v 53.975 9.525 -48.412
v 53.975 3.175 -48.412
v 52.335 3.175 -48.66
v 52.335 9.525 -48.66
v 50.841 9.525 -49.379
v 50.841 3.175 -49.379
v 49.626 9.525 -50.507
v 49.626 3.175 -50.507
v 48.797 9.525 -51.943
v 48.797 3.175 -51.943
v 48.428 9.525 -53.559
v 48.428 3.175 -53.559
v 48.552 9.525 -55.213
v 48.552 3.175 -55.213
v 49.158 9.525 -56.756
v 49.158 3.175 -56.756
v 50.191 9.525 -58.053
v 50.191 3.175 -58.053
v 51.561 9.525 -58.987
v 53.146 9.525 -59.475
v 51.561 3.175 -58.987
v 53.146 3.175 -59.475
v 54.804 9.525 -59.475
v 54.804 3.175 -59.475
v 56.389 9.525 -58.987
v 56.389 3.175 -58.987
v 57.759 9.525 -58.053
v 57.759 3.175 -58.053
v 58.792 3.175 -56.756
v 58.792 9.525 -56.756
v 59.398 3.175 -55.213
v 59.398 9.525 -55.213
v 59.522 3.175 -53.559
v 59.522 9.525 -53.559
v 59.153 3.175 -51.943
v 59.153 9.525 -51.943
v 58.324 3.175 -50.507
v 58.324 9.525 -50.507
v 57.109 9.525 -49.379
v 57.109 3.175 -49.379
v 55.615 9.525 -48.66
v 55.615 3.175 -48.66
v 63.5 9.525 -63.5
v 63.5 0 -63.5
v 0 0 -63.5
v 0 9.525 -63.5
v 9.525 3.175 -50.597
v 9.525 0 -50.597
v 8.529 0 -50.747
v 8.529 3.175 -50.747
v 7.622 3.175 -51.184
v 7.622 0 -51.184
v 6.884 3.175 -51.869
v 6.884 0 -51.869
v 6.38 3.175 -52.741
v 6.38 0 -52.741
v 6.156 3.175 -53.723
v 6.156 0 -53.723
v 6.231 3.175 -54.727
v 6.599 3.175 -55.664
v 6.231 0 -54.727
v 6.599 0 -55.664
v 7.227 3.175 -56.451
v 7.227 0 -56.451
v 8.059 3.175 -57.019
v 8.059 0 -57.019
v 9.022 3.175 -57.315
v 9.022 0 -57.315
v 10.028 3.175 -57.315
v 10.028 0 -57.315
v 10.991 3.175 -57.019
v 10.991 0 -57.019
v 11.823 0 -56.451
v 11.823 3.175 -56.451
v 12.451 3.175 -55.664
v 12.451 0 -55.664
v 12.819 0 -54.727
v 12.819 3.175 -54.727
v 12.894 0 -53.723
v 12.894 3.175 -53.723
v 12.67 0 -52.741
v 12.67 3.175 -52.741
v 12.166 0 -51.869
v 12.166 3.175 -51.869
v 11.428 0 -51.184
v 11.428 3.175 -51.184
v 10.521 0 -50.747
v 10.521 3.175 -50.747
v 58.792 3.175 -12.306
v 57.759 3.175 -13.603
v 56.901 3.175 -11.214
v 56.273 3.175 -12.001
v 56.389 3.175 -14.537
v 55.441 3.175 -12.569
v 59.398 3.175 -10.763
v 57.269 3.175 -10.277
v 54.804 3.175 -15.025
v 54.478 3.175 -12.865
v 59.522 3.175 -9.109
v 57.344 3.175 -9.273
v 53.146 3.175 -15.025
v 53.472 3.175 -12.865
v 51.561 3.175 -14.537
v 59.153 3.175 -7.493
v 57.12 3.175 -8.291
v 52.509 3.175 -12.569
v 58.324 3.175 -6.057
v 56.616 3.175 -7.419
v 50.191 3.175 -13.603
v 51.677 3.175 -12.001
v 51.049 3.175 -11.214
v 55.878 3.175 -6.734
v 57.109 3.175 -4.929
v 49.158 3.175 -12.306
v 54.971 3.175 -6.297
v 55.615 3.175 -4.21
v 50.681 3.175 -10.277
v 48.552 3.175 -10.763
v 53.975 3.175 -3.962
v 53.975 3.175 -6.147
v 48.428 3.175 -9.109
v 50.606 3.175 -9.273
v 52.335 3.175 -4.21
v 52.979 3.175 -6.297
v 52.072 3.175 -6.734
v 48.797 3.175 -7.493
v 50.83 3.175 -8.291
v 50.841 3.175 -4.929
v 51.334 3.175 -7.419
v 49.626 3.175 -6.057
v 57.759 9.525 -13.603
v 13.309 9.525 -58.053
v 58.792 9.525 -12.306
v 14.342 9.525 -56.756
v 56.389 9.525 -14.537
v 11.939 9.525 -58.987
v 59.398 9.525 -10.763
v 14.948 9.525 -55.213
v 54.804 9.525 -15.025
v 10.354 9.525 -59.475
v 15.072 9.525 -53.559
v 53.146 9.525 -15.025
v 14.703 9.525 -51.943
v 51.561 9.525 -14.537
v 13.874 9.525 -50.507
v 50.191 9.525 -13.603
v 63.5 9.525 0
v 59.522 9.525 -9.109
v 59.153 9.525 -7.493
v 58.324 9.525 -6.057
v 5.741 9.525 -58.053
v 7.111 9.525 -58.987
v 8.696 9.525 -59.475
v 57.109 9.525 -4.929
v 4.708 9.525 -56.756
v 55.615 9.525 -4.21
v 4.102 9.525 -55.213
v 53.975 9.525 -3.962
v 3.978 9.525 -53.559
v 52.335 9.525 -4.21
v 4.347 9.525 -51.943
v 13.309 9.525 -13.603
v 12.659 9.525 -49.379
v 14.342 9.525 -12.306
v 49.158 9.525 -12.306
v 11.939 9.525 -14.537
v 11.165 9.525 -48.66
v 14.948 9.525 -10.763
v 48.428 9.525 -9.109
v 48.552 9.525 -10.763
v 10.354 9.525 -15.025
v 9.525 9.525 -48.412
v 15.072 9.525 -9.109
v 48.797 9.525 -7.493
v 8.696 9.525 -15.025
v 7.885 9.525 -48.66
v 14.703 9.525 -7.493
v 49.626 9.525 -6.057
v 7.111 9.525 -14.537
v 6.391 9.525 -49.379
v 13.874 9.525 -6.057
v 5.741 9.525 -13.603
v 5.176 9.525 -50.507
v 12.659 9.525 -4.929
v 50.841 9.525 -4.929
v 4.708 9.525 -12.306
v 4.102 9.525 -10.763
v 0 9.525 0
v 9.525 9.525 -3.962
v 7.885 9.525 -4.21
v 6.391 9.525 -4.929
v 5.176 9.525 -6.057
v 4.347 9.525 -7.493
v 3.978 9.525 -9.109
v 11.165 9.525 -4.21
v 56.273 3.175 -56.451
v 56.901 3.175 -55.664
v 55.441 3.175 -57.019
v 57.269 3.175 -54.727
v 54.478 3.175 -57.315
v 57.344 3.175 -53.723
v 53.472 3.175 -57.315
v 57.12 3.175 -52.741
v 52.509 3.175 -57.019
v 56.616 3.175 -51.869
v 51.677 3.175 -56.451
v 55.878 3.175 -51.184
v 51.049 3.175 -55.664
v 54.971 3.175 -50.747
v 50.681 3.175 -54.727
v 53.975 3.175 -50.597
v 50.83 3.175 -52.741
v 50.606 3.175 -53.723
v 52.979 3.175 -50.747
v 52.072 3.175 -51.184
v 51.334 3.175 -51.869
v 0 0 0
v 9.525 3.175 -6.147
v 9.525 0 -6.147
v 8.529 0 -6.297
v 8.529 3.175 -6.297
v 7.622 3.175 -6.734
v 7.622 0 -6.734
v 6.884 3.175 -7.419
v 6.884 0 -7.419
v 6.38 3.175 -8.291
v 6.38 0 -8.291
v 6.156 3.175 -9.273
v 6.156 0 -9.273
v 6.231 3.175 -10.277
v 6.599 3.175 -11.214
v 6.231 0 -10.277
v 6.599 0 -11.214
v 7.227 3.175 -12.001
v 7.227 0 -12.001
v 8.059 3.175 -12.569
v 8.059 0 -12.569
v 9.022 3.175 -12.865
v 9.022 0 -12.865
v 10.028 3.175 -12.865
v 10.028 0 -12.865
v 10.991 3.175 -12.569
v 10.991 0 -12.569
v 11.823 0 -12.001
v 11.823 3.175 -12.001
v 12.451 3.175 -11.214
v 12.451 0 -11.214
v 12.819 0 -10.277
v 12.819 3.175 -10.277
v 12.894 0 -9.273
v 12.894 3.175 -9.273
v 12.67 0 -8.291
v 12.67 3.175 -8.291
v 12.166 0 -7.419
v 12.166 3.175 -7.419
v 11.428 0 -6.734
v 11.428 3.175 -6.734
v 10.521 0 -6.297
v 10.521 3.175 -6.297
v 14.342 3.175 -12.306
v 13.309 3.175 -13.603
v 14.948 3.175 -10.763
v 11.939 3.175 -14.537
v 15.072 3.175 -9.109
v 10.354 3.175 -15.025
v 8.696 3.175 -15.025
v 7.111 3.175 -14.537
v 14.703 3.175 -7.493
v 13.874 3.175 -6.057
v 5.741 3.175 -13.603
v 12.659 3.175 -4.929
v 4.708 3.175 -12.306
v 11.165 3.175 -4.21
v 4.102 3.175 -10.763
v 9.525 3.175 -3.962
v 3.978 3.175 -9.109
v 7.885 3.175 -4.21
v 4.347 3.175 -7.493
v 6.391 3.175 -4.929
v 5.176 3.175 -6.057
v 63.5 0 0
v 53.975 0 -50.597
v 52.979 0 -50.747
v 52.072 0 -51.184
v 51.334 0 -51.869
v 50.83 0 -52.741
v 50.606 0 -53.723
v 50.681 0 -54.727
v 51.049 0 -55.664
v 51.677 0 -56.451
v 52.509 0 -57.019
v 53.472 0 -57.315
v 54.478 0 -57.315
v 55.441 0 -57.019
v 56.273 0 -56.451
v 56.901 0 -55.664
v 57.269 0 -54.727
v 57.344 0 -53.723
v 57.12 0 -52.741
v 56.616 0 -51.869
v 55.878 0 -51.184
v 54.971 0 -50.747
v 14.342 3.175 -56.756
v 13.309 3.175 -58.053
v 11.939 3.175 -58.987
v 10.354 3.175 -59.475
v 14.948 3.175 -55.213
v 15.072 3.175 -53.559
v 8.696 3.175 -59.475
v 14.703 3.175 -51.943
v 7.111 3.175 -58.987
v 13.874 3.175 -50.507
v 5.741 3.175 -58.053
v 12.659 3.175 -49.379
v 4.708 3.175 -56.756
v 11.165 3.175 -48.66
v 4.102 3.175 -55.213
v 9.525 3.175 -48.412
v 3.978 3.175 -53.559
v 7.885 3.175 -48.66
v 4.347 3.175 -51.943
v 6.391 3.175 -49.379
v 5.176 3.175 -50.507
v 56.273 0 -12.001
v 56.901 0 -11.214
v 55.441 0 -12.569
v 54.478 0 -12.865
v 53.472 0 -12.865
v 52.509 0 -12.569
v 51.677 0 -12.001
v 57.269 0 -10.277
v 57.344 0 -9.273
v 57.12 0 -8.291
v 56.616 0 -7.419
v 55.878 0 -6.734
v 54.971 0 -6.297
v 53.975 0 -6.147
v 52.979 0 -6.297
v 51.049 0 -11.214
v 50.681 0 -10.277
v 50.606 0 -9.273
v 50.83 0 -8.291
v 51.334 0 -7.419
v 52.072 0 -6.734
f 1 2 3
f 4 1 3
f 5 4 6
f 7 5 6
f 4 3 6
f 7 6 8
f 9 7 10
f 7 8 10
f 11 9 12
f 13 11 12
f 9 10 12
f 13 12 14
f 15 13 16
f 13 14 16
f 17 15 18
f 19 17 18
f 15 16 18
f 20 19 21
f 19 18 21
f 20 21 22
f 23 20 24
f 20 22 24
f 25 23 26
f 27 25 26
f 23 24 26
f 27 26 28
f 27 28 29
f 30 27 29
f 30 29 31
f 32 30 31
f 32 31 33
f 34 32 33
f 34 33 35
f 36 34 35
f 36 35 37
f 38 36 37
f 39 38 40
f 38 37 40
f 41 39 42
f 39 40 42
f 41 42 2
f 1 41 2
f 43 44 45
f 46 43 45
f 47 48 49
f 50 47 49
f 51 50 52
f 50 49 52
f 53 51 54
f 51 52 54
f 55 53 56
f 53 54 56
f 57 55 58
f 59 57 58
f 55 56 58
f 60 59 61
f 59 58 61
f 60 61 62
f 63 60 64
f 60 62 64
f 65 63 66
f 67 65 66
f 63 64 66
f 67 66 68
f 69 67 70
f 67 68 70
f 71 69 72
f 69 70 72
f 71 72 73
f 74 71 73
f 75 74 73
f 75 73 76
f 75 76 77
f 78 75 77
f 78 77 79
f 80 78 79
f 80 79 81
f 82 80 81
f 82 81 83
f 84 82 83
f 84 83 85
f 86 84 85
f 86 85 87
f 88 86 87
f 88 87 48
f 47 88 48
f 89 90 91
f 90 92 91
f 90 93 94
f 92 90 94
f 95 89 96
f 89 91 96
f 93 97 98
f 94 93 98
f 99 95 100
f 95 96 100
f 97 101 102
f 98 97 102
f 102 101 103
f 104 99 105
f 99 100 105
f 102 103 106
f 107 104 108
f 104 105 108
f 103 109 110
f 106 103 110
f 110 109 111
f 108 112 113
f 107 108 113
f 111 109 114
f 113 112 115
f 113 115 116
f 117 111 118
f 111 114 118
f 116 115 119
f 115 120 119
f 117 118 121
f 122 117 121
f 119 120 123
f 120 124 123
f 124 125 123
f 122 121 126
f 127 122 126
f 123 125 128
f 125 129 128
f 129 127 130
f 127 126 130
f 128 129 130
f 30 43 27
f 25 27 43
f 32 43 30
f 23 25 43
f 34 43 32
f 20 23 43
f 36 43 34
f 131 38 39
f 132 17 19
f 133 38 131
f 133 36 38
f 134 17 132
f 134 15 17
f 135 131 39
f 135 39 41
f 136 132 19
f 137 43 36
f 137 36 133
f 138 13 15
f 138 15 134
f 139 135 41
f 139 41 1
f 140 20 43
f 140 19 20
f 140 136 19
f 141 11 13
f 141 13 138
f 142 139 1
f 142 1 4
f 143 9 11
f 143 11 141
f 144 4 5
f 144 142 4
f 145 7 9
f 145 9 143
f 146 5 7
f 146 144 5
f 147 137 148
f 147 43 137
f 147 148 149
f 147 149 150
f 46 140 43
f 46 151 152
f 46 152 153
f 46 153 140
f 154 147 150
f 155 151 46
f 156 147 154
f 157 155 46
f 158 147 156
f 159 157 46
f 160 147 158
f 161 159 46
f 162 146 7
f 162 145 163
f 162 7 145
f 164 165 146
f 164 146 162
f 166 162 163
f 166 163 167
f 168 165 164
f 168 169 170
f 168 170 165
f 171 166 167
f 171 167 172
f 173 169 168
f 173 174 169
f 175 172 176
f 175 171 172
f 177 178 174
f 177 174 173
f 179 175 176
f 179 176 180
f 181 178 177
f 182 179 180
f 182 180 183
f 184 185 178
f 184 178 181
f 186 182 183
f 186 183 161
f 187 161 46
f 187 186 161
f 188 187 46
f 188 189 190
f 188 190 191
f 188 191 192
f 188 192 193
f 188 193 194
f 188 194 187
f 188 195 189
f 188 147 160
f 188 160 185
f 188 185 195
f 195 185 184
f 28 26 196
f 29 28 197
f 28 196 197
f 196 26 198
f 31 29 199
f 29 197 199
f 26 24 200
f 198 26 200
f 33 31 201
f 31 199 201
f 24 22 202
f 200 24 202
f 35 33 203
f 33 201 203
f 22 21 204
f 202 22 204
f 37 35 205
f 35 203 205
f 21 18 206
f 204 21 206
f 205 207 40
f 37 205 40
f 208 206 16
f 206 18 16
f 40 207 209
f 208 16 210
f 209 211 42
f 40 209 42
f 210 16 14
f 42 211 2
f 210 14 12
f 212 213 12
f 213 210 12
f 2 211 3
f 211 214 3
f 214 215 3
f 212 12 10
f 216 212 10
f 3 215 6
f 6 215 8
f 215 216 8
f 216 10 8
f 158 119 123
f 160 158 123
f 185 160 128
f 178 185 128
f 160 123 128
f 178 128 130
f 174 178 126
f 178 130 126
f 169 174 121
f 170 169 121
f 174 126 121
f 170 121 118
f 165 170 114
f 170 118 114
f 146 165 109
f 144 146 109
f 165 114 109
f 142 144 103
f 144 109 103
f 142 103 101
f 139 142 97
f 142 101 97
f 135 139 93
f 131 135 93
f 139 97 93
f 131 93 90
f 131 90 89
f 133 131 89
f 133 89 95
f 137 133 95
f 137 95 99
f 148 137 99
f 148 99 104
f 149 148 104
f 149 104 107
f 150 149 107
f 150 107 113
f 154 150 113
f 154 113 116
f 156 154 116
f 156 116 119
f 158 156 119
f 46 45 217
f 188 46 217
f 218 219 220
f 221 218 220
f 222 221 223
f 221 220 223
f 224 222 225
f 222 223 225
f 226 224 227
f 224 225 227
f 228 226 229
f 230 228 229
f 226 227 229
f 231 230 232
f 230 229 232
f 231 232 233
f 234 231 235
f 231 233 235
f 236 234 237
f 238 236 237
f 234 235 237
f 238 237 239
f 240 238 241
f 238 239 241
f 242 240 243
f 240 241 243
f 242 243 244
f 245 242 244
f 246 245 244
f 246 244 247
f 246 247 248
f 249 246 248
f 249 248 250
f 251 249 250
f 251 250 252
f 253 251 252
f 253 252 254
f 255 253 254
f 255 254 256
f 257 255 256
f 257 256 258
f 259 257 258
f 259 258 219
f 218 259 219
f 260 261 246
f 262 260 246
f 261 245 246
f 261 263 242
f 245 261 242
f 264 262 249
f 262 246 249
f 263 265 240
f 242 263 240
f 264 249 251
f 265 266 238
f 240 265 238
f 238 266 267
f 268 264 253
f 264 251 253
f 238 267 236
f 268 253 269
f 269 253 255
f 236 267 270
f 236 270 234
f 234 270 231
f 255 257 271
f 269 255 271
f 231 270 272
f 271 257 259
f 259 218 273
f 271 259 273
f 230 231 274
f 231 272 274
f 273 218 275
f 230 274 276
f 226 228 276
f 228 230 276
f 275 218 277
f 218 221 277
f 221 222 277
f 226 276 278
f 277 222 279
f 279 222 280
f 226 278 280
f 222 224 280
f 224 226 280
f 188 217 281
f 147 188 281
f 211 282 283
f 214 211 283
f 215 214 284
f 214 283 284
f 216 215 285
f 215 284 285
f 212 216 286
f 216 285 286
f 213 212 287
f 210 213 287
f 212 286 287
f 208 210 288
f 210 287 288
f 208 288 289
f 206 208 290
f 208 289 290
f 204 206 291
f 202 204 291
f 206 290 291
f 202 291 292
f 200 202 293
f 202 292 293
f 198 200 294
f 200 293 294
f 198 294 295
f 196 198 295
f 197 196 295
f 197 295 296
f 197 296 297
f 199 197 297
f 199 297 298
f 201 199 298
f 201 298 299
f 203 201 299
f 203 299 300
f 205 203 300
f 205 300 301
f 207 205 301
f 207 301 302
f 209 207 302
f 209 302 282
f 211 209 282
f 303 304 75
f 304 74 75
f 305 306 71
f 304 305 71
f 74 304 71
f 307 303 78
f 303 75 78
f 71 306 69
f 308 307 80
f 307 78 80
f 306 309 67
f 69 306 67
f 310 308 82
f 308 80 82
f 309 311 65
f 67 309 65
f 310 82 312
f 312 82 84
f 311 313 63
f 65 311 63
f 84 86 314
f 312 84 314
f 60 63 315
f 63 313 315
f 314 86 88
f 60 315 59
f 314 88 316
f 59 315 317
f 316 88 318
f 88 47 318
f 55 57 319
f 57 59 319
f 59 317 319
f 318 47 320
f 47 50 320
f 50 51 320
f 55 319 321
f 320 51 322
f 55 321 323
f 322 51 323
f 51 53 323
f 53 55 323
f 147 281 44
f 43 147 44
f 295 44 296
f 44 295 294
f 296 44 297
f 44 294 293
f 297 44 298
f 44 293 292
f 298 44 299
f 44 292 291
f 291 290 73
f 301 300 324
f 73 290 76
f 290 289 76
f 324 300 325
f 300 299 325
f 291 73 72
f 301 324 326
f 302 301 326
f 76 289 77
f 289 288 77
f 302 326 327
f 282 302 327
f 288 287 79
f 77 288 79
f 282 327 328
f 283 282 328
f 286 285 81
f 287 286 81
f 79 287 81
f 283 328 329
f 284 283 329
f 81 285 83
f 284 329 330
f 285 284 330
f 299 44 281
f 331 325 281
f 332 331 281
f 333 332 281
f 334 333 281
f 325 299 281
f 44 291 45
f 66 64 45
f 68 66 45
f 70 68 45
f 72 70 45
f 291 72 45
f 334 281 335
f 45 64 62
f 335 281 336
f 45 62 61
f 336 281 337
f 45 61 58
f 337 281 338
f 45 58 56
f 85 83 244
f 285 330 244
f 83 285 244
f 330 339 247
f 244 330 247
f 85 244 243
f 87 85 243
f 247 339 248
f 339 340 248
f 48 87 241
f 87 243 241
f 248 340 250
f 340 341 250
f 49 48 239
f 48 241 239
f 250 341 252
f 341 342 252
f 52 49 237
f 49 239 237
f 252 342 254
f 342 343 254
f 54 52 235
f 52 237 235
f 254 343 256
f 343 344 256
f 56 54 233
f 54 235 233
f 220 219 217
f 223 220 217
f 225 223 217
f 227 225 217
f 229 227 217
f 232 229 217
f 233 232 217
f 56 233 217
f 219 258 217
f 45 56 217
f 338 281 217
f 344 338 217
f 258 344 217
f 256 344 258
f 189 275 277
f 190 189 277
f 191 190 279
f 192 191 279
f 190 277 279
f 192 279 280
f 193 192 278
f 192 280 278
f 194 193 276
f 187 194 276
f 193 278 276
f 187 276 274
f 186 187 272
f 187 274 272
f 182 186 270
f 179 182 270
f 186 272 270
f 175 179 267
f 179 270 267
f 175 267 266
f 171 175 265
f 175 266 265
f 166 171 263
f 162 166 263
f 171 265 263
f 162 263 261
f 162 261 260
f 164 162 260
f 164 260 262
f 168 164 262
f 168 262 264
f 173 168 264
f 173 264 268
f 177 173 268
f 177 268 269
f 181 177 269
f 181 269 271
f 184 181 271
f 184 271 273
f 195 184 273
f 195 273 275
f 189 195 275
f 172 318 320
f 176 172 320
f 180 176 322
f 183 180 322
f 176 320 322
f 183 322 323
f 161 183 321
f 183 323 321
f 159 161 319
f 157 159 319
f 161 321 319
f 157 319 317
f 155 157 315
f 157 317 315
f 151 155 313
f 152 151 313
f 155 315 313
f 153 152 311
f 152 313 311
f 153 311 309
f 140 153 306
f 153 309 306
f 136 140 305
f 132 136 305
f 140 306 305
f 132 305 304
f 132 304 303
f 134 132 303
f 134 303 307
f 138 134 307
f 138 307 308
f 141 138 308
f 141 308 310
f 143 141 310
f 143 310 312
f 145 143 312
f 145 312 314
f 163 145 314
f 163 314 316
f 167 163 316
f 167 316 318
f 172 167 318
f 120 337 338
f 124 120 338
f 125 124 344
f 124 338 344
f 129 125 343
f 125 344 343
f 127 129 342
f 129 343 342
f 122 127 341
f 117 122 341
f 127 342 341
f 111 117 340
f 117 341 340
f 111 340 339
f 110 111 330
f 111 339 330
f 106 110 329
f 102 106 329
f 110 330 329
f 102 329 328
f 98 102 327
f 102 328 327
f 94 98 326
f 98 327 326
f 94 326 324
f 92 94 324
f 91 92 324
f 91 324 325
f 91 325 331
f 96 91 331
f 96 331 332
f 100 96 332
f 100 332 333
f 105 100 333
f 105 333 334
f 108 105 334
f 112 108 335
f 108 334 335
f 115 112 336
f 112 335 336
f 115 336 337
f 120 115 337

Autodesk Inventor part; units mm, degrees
ref_plane "YZ Plane" through (0, 0, 0) normal (1, 0, 0) x (0, 1, 0)
ref_plane "XZ Plane" through (0, 0, 0) normal (0, 1, 0) x (-1, 0, 0)
ref_plane "XY Plane" through (0, 0, 0) normal (0, 0, 1) x (1, 0, 0)
sketch "Sketch1" plane through (0, 0, 0) normal (0, 1, 0) x (-1, 0, 0)
  line L0 (0, 0) -> (-63.5, 0)
  line L1 (-63.5, 0) -> (-63.5, -63.5)
  line L2 (-63.5, -63.5) -> (0, -63.5)
  line L3 (0, -63.5) -> (0, 0)
  dimension "d0" = 63.5
  dimension "d1" = 63.5
extrude "Extrusion1" add sketch "Sketch1" along normal blind 9.525
sketch "Sketch2" plane through (0, 9.525, 0) normal (0, 1, 0) x (1, 0, 0)
  line L0 (0, 0) -> (63.5, 0) projected
  line L1 (63.5, 0) -> (63.5, 63.5) projected
  line L2 (63.5, 63.5) -> (0, 63.5) projected
  line L3 (0, 63.5) -> (0, 0) projected
  line L4 (9.525, 53.975) -> (53.975, 53.975)
  line L5 (53.975, 53.975) -> (53.975, 9.525)
  line L6 (53.975, 9.525) -> (9.525, 9.525)
  line L7 (9.525, 9.525) -> (9.525, 53.975)
  dimension "d4" = 9.525
hole "Hole1" at (53.975, 9.525, -9.525) at (53.975, 9.525, -53.975) at (9.525, 9.525, -53.975) at (9.525, 9.525, -9.525) direction (0, -1, 0) diameter 6.7564 end through all counterbore diameter 11.1252 counterbore depth 6.35 clearance for "Socket Head Cap Screw" size "1/4" standard "Ansi Unified Screw Threads"
equation "\"d0\" = d1"
properties part number "Block"
